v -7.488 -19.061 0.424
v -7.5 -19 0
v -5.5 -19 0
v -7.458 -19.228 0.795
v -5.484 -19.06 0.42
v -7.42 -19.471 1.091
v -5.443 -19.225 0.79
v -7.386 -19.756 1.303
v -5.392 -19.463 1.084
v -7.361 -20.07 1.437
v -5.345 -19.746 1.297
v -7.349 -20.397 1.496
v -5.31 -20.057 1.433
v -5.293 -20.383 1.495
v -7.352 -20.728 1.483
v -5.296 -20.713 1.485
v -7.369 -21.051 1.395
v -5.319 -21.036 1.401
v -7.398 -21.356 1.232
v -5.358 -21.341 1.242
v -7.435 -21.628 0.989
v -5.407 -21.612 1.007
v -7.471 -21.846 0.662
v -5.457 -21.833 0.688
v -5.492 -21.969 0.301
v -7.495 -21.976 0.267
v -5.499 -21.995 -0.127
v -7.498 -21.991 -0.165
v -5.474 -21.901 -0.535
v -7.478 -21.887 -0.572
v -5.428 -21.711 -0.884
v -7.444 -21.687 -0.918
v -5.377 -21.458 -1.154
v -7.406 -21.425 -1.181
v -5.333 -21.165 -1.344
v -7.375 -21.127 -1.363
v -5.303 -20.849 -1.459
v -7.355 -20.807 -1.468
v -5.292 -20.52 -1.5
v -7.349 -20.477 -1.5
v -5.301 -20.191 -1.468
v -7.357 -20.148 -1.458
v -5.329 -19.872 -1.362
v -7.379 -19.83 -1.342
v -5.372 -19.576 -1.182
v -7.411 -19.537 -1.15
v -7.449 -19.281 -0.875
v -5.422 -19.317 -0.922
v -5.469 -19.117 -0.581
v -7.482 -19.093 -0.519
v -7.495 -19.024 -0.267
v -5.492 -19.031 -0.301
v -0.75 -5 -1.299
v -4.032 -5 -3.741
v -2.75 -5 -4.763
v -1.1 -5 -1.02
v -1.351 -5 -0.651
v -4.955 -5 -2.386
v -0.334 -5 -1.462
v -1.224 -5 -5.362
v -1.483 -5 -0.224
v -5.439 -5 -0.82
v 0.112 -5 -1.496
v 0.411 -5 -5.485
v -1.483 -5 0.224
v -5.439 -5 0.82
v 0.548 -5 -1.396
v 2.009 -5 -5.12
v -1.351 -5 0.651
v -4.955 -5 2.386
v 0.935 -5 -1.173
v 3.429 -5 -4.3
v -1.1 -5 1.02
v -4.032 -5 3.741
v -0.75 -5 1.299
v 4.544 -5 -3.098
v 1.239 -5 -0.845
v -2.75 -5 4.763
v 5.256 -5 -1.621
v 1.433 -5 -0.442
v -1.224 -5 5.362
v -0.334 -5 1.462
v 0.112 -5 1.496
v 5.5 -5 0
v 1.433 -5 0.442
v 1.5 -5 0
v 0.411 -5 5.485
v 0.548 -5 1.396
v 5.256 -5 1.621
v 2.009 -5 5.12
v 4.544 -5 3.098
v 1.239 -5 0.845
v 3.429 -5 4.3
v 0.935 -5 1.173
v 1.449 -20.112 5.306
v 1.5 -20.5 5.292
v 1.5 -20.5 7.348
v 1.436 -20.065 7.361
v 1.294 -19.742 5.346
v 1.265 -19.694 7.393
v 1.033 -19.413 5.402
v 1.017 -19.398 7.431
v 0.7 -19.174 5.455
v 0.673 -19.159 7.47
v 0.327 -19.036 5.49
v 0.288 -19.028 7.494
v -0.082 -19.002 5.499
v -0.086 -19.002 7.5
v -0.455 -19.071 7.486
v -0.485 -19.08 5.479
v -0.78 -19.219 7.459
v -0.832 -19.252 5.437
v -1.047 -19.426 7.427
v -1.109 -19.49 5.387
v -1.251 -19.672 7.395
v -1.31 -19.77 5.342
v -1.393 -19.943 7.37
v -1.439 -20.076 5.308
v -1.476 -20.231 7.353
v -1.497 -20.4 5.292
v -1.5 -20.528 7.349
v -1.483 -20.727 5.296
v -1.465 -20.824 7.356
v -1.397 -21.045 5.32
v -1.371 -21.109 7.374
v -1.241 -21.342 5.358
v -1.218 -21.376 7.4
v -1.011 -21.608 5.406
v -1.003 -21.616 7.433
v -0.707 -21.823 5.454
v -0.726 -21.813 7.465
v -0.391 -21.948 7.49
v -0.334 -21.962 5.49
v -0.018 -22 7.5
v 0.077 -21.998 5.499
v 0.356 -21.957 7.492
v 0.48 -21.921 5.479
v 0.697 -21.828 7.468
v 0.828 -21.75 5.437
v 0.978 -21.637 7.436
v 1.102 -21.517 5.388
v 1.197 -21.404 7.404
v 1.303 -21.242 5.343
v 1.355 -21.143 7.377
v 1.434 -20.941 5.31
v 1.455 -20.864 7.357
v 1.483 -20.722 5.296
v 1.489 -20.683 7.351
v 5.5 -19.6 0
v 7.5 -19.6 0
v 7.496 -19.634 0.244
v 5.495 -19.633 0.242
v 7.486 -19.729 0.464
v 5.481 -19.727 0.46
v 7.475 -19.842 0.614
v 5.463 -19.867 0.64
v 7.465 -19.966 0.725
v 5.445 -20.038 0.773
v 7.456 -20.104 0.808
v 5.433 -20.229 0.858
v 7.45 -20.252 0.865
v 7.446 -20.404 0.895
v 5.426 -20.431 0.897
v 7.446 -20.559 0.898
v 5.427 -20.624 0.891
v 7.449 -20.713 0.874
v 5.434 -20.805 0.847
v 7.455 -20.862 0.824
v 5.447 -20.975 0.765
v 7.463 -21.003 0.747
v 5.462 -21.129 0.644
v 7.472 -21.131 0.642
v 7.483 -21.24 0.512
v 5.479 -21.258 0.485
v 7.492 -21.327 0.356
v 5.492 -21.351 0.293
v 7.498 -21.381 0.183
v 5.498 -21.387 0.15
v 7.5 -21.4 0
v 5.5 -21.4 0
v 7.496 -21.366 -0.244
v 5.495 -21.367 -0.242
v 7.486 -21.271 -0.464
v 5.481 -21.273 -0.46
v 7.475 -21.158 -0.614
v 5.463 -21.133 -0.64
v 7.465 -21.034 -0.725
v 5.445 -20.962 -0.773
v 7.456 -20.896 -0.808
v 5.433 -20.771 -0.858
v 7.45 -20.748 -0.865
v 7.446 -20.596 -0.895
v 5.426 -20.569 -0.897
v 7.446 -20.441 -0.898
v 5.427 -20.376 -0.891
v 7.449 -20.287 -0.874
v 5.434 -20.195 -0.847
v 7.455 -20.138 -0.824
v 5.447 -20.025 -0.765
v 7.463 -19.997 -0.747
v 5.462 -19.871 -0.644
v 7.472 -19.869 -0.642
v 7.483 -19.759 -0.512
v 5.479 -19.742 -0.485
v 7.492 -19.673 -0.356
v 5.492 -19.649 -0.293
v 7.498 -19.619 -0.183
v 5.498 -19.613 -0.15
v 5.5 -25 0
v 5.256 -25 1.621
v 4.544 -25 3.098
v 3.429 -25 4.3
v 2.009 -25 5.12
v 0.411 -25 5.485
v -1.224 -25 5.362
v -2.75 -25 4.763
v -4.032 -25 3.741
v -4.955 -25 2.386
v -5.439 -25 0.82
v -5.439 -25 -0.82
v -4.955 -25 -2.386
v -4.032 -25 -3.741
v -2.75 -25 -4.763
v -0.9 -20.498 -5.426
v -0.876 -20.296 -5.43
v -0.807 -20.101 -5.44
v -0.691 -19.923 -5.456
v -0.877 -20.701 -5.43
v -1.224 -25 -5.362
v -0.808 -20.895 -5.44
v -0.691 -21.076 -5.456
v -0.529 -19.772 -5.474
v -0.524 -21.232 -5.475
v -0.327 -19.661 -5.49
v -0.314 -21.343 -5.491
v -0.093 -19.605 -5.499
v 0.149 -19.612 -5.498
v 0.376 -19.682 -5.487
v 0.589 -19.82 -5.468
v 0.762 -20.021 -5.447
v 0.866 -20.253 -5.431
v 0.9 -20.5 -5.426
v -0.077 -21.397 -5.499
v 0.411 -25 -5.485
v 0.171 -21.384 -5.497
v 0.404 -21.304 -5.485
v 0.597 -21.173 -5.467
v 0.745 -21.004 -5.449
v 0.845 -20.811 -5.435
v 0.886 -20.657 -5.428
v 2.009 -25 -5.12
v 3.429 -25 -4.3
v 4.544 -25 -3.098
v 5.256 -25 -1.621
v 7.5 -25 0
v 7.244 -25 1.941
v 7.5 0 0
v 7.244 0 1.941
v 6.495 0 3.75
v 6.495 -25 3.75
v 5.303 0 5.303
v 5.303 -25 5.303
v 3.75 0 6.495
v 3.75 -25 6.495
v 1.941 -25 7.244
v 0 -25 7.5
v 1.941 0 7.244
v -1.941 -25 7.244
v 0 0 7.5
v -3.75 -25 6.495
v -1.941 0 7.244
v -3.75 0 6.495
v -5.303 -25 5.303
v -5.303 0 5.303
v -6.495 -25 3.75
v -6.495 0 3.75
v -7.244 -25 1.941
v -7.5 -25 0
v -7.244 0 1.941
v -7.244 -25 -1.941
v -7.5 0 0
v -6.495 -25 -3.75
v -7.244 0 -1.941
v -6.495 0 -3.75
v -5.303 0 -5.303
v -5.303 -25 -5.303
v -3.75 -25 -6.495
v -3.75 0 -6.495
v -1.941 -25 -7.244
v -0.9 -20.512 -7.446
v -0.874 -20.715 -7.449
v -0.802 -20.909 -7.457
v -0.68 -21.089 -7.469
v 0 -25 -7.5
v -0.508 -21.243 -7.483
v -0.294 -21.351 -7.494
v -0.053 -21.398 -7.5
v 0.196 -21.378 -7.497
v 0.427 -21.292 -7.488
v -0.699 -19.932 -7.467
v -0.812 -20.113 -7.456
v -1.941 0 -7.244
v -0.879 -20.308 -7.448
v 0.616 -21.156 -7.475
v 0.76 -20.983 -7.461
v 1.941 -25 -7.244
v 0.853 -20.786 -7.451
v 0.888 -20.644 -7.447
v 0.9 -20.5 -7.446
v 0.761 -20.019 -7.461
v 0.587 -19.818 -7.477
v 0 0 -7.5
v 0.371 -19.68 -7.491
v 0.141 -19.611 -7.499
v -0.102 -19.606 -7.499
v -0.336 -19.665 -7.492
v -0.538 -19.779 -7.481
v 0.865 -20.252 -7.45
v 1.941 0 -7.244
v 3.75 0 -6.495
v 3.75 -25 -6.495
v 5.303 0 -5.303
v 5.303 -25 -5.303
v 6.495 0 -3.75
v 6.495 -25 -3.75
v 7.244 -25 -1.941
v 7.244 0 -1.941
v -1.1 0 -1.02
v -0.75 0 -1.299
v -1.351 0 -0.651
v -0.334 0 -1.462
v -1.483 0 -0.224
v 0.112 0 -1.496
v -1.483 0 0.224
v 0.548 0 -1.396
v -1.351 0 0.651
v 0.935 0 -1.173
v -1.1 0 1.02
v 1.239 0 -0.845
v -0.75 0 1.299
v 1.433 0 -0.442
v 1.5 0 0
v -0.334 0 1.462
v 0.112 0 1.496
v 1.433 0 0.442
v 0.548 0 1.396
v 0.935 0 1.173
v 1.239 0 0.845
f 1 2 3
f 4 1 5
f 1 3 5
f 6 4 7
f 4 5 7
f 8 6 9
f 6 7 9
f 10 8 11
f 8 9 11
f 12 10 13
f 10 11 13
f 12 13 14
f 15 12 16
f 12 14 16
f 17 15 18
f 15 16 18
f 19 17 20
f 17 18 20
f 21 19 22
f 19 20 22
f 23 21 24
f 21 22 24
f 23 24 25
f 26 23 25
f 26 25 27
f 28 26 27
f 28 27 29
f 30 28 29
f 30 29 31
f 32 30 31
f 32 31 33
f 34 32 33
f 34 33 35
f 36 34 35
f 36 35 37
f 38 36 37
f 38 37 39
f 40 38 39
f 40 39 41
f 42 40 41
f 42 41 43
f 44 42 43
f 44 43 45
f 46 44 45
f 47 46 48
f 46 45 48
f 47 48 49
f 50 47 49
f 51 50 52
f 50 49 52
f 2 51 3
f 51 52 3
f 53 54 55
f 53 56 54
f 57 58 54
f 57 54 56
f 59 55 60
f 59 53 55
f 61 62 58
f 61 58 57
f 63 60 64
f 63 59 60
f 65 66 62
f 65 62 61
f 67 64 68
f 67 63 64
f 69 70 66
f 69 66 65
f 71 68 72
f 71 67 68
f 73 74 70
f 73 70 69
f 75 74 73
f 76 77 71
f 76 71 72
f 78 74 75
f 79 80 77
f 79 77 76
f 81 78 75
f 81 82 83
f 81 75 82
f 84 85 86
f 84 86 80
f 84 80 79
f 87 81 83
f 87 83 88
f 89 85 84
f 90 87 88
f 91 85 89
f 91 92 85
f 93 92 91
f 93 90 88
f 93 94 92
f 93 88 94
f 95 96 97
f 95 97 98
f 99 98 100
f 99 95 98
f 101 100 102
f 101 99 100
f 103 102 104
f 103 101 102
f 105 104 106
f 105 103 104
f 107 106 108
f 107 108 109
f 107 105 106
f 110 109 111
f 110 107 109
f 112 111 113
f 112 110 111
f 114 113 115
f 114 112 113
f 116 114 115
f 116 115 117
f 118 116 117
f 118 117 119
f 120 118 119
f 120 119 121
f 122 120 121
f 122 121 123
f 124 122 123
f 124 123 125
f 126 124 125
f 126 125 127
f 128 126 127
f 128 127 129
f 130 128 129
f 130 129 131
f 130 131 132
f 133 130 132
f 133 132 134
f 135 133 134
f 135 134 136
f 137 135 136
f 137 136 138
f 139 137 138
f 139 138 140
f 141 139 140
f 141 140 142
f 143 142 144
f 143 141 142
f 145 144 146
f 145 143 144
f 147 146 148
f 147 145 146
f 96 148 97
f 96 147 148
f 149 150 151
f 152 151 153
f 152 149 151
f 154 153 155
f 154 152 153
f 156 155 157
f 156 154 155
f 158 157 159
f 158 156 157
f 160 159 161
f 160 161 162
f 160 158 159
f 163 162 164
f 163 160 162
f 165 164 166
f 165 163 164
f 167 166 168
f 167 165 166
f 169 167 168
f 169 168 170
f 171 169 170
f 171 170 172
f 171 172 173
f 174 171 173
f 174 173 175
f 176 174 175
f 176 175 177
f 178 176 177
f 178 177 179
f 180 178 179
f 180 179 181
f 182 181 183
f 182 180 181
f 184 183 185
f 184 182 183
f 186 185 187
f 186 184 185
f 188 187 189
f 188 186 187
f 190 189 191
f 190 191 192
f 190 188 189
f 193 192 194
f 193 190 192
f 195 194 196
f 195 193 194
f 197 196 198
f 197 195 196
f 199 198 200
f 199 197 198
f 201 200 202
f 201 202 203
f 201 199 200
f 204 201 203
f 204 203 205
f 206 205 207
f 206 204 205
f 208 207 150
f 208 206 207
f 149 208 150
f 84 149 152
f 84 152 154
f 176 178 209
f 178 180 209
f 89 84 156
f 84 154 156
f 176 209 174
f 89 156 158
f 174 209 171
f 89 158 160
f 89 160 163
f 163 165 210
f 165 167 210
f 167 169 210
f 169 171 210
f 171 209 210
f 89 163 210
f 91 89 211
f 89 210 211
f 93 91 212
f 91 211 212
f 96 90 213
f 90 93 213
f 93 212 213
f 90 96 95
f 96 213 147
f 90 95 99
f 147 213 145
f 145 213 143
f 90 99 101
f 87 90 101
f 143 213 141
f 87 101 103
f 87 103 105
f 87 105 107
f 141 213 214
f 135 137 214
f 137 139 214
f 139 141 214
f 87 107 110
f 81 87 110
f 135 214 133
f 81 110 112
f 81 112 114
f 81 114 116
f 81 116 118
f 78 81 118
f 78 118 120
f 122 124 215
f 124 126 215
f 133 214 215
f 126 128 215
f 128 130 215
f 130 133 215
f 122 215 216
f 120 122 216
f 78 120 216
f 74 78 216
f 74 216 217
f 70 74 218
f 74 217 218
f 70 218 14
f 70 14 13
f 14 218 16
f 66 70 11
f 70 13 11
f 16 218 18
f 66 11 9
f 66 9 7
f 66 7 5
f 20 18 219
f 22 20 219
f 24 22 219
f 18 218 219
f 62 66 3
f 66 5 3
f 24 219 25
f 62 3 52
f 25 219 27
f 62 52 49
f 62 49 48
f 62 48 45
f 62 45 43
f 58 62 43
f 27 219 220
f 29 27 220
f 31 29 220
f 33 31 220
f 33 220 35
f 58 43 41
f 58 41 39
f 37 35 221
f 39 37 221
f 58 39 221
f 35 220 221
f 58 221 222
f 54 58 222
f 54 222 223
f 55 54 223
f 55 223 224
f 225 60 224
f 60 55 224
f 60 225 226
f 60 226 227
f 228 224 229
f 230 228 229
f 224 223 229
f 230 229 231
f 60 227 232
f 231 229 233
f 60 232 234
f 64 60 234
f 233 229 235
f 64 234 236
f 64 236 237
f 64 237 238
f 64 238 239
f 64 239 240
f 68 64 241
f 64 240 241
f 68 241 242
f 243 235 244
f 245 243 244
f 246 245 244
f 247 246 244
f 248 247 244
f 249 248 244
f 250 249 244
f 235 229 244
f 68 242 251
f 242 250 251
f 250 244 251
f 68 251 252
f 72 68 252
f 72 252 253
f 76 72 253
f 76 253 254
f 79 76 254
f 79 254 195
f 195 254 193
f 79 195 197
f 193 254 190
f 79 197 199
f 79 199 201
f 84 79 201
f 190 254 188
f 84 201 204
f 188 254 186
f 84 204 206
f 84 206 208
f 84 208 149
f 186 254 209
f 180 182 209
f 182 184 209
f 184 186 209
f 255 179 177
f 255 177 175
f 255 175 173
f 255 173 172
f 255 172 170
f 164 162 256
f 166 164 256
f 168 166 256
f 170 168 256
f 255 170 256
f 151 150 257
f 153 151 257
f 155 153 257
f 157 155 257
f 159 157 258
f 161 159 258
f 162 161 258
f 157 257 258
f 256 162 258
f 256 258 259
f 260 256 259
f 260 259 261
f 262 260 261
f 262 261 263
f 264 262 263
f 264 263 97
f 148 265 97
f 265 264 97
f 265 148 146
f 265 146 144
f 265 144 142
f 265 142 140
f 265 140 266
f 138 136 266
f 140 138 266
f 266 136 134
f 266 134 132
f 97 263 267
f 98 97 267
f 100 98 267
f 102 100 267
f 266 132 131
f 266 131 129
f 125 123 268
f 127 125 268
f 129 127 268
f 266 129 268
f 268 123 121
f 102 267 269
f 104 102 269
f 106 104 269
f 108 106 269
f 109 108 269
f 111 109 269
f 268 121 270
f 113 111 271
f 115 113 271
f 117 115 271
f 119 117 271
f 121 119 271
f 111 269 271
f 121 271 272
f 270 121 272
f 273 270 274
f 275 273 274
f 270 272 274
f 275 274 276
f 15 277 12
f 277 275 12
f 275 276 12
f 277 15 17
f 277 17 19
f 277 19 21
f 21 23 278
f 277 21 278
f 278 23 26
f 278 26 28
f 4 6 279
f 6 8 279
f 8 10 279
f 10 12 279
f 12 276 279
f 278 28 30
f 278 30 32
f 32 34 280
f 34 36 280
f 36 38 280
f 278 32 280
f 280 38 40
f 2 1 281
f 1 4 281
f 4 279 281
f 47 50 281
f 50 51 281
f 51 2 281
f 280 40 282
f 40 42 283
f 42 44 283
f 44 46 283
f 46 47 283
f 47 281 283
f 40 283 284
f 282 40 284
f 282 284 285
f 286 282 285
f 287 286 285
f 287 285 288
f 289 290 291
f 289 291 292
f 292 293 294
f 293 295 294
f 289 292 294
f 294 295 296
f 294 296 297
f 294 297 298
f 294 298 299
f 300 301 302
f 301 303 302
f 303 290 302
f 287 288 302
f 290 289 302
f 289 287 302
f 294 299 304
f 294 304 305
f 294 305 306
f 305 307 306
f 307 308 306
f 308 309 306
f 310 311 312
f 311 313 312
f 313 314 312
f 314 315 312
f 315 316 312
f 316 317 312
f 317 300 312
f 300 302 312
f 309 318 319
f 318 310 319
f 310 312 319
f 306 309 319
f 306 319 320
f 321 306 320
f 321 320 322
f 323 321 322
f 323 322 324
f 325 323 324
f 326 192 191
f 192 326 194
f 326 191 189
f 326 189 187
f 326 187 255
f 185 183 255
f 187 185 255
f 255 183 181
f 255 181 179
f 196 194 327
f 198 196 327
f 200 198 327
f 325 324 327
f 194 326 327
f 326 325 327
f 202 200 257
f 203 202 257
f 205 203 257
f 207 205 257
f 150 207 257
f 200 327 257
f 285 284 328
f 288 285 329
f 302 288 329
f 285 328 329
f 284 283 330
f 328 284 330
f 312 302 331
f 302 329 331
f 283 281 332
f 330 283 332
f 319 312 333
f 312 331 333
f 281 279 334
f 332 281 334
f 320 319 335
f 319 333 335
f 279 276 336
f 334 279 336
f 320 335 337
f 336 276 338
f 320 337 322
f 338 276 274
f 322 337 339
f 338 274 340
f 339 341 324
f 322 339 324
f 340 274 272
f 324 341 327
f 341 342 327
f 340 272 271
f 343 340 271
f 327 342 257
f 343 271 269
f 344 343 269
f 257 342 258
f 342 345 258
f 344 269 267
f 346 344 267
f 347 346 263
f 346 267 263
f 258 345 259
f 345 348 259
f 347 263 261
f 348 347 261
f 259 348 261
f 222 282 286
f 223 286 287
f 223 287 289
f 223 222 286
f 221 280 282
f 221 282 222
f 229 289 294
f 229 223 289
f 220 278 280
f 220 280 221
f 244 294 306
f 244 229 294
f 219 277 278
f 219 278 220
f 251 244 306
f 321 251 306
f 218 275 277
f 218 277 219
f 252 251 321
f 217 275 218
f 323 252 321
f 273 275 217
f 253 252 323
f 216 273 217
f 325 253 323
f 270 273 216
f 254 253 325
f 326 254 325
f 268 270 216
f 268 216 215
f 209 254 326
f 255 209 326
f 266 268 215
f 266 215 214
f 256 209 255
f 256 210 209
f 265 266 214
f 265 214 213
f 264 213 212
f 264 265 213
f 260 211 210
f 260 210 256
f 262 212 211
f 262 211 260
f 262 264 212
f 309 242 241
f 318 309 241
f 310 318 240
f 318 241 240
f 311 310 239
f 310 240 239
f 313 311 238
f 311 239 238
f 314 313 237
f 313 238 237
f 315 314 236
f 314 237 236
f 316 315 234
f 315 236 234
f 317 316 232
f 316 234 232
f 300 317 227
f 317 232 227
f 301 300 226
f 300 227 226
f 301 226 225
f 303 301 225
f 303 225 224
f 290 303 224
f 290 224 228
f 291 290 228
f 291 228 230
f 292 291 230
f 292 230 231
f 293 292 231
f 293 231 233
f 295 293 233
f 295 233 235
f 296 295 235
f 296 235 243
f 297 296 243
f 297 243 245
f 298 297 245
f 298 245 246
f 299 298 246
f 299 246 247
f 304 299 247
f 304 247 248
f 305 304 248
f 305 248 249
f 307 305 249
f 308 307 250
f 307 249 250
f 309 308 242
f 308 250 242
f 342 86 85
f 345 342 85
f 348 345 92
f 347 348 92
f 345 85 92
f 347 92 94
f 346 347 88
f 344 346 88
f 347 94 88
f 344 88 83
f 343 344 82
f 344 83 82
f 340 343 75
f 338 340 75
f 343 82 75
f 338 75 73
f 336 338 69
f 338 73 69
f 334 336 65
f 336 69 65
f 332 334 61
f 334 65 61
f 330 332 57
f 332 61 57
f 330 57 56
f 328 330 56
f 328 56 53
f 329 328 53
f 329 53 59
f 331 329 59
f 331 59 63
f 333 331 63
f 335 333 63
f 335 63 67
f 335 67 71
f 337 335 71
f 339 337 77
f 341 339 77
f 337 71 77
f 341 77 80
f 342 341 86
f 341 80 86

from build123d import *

# Parameters (mm, degrees)
F0_R      = 7.5
F1_DEPTH  = 25
F2_R      = 5.5
F3_DEPTH  = 20
F4_R      = 1.5
F5_DEPTH  = 5
F6_R      = 1.5
F7_DEPTH  = 7.501
F8_R      = 0.9
F9_DEPTH  = 7.501
F10_R     = 1.5
F11_DEPTH = 7.501
F12_R     = 0.9
F13_DEPTH = 7.501


with BuildPart() as f1:
    # F0 (on Front) → F1 (new body)
    with BuildSketch(Plane.XZ):
        Circle(F0_R)
    extrude(amount=F1_DEPTH)

    # F2 (on face) → F3 (cut)
    with BuildSketch(Plane.XZ.offset(25)):
        Circle(F2_R)
    extrude(amount=-F3_DEPTH, mode=Mode.SUBTRACT)

    # F4 (on face) → F5 (cut, through all)
    with BuildSketch(Plane.XZ.offset(5)):
        Circle(F4_R)
    extrude(amount=-F5_DEPTH, mode=Mode.SUBTRACT)

    # F6 (on Top) → F7 (cut, through all)
    with BuildSketch(Plane.XY):
        with Locations((0, -20.5)):
            Circle(F6_R)
    extrude(amount=F7_DEPTH, mode=Mode.SUBTRACT)

    # F8 (on Top) → F9 (cut, through all)
    with BuildSketch(Plane.XY):
        with Locations((0, -20.5)):
            Circle(F8_R)
    extrude(amount=-F9_DEPTH, mode=Mode.SUBTRACT)

    # F10 (on Right) → F11 (cut, through all)
    with BuildSketch(Plane.YZ):
        with Locations((-20.5, 0)):
            Circle(F10_R)
    extrude(amount=-F11_DEPTH, mode=Mode.SUBTRACT)

    # F12 (on Right) → F13 (cut, through all)
    with BuildSketch(Plane.YZ):
        with Locations((-20.5, 0)):
            Circle(F12_R)
    extrude(amount=F13_DEPTH, mode=Mode.SUBTRACT)


solid = f1.part
